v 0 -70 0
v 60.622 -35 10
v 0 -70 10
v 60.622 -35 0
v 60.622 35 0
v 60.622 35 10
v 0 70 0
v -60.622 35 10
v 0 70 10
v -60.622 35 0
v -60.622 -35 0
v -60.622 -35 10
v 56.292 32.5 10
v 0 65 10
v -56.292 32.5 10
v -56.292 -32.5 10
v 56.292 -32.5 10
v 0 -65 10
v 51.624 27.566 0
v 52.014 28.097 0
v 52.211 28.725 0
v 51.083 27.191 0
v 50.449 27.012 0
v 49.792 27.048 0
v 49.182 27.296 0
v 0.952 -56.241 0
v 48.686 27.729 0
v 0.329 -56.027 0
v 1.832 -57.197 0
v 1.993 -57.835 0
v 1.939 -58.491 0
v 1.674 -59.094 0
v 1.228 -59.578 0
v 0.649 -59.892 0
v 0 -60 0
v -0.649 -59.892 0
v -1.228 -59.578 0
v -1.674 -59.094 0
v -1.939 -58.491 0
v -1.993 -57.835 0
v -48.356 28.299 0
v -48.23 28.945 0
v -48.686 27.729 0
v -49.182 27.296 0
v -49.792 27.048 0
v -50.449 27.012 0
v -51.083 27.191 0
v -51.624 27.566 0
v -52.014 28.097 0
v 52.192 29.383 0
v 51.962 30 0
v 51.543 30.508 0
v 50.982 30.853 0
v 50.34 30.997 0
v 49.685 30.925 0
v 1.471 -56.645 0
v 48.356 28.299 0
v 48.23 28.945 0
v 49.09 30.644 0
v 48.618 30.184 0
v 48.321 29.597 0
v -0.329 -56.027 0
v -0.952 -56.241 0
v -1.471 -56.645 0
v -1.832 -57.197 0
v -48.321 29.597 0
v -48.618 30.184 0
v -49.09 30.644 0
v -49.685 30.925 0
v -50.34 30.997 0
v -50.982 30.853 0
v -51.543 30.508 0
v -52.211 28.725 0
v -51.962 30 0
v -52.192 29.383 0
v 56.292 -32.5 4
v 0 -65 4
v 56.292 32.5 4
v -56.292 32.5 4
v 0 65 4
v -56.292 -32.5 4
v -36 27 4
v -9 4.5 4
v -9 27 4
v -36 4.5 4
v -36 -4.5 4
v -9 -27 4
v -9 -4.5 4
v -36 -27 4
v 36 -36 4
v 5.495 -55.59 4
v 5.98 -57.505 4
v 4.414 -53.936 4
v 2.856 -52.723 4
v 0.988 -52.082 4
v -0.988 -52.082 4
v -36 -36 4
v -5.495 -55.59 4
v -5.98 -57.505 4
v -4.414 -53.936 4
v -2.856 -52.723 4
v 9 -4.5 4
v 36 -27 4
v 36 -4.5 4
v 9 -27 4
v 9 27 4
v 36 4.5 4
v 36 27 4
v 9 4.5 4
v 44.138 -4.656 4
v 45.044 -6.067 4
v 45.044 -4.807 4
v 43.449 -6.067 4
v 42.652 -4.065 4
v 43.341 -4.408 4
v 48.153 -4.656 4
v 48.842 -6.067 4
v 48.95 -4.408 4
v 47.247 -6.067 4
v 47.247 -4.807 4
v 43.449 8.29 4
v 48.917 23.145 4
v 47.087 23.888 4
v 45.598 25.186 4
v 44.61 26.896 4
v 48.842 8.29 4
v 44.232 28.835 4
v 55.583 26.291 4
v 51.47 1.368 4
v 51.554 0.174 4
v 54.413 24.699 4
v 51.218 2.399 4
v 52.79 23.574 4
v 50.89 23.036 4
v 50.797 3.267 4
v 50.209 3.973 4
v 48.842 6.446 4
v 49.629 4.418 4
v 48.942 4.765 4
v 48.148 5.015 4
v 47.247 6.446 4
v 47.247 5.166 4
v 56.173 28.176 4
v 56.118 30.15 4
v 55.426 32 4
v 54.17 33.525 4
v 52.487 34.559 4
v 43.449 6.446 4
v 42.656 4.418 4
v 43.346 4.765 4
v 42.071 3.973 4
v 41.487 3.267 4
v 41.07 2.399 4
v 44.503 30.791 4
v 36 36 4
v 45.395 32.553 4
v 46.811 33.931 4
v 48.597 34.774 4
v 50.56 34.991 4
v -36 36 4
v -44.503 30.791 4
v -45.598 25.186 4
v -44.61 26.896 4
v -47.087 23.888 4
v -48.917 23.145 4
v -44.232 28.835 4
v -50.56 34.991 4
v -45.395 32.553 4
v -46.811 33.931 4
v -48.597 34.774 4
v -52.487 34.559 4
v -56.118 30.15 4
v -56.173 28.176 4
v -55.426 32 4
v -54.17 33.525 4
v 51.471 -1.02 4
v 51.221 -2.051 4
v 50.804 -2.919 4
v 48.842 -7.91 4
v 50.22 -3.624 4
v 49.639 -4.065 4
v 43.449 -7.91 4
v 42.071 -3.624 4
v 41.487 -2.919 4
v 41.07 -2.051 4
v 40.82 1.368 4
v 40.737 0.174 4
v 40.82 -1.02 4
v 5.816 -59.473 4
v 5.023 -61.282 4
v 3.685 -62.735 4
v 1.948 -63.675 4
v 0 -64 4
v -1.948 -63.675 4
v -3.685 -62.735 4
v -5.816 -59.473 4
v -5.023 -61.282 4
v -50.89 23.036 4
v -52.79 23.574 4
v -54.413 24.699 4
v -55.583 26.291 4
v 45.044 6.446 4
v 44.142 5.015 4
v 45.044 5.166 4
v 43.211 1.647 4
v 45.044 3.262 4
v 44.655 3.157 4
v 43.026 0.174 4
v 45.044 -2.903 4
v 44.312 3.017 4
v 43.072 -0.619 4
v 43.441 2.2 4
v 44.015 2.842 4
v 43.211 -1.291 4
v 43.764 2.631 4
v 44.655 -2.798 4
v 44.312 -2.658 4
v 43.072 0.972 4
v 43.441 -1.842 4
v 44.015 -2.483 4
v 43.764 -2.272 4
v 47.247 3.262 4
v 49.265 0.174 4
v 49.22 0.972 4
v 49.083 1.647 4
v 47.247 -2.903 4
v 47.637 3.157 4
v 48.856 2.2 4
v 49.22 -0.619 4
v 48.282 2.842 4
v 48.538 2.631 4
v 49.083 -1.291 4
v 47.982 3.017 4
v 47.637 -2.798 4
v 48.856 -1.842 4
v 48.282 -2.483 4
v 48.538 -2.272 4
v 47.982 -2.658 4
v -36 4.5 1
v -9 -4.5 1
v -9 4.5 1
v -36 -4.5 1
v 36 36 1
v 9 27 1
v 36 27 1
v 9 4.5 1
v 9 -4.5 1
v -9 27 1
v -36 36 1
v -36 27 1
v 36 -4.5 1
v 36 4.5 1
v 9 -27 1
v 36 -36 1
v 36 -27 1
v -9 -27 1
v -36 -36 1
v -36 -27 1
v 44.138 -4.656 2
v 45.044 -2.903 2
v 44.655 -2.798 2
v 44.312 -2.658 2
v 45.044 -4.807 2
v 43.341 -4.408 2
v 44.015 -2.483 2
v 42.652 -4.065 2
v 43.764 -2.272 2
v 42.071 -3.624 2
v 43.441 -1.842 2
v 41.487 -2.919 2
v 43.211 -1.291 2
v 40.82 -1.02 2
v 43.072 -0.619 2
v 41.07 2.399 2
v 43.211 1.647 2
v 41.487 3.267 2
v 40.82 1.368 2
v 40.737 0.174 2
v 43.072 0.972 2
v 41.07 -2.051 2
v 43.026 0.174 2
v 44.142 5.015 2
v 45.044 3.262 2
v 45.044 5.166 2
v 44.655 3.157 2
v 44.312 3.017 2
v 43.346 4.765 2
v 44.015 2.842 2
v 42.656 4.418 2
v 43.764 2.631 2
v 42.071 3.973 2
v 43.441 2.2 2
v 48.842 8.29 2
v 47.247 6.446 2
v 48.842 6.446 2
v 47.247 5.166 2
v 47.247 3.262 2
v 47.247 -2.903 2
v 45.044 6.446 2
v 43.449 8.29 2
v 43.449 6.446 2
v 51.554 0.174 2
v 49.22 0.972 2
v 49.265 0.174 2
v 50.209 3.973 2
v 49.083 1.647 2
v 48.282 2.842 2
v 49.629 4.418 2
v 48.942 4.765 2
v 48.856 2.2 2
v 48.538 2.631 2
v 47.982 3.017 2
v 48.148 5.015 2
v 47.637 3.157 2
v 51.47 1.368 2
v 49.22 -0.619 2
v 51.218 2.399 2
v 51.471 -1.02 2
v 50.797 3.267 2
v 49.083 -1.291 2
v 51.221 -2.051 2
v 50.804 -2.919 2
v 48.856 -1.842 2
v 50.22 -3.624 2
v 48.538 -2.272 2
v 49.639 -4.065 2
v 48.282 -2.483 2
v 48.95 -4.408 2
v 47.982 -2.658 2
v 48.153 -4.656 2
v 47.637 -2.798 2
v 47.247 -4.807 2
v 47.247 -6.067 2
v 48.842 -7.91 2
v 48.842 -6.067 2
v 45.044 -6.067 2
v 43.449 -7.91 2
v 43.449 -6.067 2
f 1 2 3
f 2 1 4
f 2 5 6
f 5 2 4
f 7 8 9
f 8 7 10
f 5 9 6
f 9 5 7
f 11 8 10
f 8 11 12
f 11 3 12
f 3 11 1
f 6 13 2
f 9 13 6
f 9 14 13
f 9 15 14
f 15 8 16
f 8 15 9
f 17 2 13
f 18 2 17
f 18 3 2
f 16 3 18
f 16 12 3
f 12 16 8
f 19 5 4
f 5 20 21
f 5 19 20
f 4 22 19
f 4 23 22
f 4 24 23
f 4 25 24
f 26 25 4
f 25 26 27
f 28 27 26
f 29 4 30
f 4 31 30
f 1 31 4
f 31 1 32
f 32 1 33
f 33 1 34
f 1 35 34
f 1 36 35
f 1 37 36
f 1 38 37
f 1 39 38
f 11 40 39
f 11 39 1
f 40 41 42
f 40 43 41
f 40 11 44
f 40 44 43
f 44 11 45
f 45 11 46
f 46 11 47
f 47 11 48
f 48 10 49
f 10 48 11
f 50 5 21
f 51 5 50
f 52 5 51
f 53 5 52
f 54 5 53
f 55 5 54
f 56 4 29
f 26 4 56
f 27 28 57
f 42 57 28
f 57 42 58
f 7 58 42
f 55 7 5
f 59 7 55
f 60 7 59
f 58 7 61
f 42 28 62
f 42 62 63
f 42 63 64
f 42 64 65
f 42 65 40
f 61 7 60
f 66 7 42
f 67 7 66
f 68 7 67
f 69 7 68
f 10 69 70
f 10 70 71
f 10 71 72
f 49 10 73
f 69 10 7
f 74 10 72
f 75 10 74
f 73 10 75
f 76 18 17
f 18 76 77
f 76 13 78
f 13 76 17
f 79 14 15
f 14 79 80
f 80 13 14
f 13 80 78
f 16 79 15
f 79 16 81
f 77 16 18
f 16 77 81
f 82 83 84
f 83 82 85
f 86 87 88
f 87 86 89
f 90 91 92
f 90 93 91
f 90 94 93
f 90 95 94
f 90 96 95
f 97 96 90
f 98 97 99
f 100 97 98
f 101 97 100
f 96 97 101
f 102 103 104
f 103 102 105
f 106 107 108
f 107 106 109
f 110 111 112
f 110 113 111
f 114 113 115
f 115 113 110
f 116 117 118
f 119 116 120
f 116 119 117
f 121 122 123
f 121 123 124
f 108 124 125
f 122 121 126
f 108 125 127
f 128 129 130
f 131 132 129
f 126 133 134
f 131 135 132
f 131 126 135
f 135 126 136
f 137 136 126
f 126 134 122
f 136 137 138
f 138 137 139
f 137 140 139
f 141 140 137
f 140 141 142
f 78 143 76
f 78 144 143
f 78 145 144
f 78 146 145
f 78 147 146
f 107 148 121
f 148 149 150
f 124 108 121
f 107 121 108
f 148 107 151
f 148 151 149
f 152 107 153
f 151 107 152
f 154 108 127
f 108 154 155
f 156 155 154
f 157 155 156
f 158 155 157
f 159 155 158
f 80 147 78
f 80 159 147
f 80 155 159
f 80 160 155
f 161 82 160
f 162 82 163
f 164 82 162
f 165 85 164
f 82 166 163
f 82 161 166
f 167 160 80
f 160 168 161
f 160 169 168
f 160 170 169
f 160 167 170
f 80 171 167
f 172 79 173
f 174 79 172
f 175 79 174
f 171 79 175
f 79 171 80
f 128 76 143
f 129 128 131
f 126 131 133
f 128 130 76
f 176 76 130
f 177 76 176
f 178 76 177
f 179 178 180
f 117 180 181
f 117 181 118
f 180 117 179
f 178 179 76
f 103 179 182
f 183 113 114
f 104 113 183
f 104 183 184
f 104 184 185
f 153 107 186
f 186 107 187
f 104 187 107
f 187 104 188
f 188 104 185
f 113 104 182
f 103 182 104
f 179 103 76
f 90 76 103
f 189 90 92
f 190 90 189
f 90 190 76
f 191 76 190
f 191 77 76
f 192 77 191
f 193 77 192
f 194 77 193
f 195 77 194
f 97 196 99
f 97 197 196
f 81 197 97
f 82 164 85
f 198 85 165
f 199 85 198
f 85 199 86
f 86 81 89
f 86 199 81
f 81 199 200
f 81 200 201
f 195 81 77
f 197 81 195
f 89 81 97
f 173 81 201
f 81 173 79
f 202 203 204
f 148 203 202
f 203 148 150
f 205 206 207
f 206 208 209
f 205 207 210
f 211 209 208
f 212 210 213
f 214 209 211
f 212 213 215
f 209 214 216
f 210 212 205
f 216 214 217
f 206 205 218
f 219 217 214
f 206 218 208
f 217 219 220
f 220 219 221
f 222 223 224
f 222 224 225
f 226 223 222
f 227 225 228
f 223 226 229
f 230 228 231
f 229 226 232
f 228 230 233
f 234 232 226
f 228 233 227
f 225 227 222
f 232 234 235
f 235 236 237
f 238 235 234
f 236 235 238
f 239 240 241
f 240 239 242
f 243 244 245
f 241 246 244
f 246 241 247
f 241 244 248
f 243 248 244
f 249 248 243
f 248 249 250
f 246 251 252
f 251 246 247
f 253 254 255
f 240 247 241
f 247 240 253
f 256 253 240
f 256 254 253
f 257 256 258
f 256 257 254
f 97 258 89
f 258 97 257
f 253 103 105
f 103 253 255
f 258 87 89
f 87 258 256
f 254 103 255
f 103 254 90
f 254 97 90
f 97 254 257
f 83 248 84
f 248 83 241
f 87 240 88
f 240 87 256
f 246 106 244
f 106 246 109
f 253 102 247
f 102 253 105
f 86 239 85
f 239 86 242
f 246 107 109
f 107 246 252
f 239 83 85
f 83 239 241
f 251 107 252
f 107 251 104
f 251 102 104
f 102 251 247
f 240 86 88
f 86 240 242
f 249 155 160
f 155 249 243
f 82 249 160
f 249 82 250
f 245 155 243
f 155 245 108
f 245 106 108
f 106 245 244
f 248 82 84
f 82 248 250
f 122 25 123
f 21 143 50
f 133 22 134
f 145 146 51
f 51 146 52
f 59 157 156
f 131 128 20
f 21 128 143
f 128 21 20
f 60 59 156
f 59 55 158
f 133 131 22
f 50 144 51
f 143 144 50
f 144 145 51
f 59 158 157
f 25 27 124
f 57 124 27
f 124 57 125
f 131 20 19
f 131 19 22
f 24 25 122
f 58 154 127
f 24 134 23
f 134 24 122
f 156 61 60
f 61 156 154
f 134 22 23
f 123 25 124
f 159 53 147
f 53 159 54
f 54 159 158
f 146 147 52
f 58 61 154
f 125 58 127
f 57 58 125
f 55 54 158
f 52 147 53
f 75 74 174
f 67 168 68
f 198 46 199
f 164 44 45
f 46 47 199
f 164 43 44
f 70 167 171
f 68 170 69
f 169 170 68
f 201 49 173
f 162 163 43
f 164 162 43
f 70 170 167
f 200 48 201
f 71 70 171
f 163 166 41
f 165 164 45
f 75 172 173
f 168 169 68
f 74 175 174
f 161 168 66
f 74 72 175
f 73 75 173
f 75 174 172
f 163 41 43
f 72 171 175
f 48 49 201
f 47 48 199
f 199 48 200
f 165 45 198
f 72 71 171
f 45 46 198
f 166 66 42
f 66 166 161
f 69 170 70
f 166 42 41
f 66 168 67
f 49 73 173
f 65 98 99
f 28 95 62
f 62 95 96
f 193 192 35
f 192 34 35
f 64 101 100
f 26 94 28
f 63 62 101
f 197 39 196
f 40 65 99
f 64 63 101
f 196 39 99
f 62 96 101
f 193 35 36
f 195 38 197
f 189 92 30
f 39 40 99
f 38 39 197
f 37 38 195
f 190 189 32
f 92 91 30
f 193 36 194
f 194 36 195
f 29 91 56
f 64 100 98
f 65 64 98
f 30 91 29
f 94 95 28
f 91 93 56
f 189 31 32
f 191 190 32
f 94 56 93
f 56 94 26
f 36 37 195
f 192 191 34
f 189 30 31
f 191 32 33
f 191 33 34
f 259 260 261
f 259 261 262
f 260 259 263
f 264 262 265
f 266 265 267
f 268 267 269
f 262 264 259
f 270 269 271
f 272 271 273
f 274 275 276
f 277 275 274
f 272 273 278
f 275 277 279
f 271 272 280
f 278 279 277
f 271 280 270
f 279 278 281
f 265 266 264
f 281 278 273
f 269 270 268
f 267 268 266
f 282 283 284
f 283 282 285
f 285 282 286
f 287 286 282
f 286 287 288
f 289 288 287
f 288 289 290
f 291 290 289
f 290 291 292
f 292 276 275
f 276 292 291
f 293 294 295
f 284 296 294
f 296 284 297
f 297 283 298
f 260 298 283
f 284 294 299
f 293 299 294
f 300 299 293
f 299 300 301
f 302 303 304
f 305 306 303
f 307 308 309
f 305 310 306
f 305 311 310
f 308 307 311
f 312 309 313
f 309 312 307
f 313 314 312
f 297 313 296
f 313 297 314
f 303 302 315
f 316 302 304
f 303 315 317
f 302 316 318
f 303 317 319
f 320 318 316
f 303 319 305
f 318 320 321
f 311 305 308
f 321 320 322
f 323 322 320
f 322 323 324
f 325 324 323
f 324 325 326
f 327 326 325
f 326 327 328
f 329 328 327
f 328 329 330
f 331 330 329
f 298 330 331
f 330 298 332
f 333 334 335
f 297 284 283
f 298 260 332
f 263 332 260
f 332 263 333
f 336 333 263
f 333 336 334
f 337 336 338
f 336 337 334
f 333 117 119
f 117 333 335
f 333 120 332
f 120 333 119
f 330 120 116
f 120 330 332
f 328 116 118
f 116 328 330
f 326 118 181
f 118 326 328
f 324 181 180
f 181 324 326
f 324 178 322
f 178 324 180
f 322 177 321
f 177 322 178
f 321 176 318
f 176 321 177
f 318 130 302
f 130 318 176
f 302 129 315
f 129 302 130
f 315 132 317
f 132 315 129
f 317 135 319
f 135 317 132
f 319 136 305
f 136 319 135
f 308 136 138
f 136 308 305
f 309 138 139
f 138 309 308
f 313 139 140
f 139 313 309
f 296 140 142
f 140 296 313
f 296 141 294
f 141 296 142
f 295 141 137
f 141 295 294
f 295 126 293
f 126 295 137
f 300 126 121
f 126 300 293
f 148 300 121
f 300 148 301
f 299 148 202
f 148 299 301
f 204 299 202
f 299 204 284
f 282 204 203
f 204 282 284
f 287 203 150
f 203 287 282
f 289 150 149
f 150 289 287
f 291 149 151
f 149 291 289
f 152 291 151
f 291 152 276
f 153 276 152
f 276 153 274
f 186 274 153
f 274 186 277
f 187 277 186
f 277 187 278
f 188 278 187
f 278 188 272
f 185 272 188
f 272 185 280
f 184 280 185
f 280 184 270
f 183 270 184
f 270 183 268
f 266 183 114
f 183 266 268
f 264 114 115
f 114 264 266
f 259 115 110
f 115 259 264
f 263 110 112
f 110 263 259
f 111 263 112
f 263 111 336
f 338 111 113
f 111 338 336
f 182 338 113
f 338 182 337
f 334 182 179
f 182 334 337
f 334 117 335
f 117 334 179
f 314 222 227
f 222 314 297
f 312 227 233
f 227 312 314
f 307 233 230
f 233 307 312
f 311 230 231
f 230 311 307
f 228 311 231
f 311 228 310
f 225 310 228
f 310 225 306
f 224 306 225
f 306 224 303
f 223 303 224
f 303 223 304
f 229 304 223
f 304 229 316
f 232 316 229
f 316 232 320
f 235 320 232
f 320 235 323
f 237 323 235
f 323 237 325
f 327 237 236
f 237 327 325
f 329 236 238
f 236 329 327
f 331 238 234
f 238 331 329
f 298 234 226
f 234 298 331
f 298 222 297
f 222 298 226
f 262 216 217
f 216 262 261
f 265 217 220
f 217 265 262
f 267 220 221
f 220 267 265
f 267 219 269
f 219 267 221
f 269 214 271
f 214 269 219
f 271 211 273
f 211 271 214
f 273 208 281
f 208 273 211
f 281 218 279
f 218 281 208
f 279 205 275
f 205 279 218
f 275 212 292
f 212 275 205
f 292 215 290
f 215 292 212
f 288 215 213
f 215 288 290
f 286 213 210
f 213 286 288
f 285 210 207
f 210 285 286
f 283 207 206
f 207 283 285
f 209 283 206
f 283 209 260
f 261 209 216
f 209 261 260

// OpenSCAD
// file: ../../../assets/components/fastener_holes.scad
/*
    Intended to make space for a fastener.

    parameters:
    -head           a vector [head length, head radius]
    -bore           a vector [bore length, bore radius]
    -countersink    countersink length, requires head radius and bore radius
*/

module fastener_hole(
    head = [0, 5],
    bore = [0, 3],
    countersink = 5
) {
    if (head[0] && head[1])
    cylinder(h = head[0], r = head[1], center = false);
    translate([0,0,-countersink]) {
        if (countersink)
        cylinder(h = countersink, r1 = bore[1], r2 = head[1], center = false);

        translate([0,0,-bore[0]]) {
            if (bore[0] && bore[1])
            cylinder(h = bore[0], r = bore[1], center = false);
        }
    }
}

module fastener_block(
    size,
    head = [0, 0],
    bore = [0, 0],
    countersink = 0
) {

    fastener_hole(head = head, bore = bore, countersink = countersink);
    translate([size.x, 0])
    fastener_hole(head = head, bore = bore, countersink = countersink);
    translate([size.x, size.y])
    fastener_hole(head = head, bore = bore, countersink = countersink);
    translate([0, size.y])
    fastener_hole(head = head, bore = bore, countersink = countersink);

}

module fastener_radial(
    radius,
    amount,
    head = [0, 6],
    bore = [0, 3],
    countersink = 5
) {
    step = 360 / amount;
    for(i = [0:amount]){
        rotate(i * step, [0,0,1])
        translate([radius,0,0]) 
        fastener_hole(head=head, bore=bore, countersink=countersink);
    }
}

// showcase
fastener_hole(
    head = [3,5],
    bore = [7,2],
    countersink = 3
);

translate([100, 0, 0]) 
fastener_block(
    size = [20, 40],
    head = [3, 5],
    bore = [10, 2],
    countersink = 0
);

translate([-150, 0, 0]) 
fastener_radial(
    radius = 50,
    amount = 8,
    head = [0, 7],
    bore = [0, 3],
    countersink = 5
);
// file: ../../../assets/components/mirrored_digit.scad
ptSegment = [                                                                   
    [ [-0, 0], [-8, 0], [-8, 2], [-0, 2] ],                    
    [ [-6, 0], [-6, 8], [-8, 8], [-8, 0] ],                    
    [ [-0, 0], [-0, 8], [-2, 8], [-2, 0] ],                    
    [ [-0, 7], [-0, 9], [-8, 9], [-8, 7] ],                    
    [ [-6, 8], [-6, 16], [-8, 16], [-8, 8] ],                    
    [ [-0, 8], [-0, 16], [-2, 16], [-2, 8] ],                    
    [ [-0, 14], [-8, 14], [-8, 16], [-0, 16] ],                    
]; 

fSevenSegment = [
    [1,1,1,0,1,1,1],                // 0
    [0,0,1,0,0,1,0],                // 1
    [1,1,0,1,0,1,1],                // 2
    [1,0,1,1,0,1,1],                // 3
    [0,0,1,1,1,1,0],                // 4
    [1,0,1,1,1,0,1],                // 5
    [1,1,1,1,1,0,1],                // 6
    [0,0,1,0,0,1,1],                // 7
    [1,1,1,1,1,1,1],                // 8
    [1,0,1,1,1,1,1]                 // 9
];

module MirroredDigit(number, scaling, height) {
    for (iSeg = [0:6]) {
        if (fSevenSegment[number][iSeg] > 0) {
            linear_extrude(height=height)
            scale([scaling, scaling, scaling]){
                translate([0, -8]){
                    mirror([1, 0, 0])
                    polygon(points=ptSegment[iSeg]);
                    polygon(points=ptSegment[iSeg]);
                }
            }
        }
    }
}
// file: ../../../assets/components/hexagon.scad
// Base shape
module Hexagon(r, height){
    rotate([0,0,30])
    cylinder($fn=6, r=r, h=height);
}
// main file
// Spacelab hexagons riddle
radius=70;
digit_relief=3;
height=10;
frame_height=6;
frame_width=5;
display_digit=3;
digit_scale=4.5;

fastener_amount=3;
fastener_head_r=6;
fastener_bore_r=2;

symbol = "Φ";
symbol_size = 16;

distance_to_side = radius * 0.866;
fastener_head = [0, fastener_head_r];
fastener_bore = [0, fastener_bore_r];
fastener_r = radius - frame_width - fastener_head_r - 1;
countersink = height - frame_height;


use <../../../assets/components/hexagon.scad>
use <../../../assets/components/mirrored_digit.scad>
use <../../../assets/components/fastener_holes.scad>

difference() {
    difference() {
        #difference() {
            difference() {
                Hexagon(r = radius, height = height);

                translate([0,0,height - frame_height])
                Hexagon(r = radius - frame_width, height = frame_height + 0.1);
            }

            translate([0,0,height - frame_height - digit_relief])
            MirroredDigit(number = display_digit, scaling = 4.5, height = digit_relief + 0.1);
        }

        rotate(360 / fastener_amount / 4, [0,0,1])
        translate([0,0,countersink])
        fastener_radial(
            radius=fastener_r,
            amount=fastener_amount,
            head=fastener_head,
            bore=fastener_bore,
            countersink=countersink
        );
    }

    translate([46,0, height - frame_height - digit_relief + 1])
    linear_extrude(height = digit_relief) 
    text(text = symbol, size = symbol_size, font="mono", valign="center", halign="center");
}
